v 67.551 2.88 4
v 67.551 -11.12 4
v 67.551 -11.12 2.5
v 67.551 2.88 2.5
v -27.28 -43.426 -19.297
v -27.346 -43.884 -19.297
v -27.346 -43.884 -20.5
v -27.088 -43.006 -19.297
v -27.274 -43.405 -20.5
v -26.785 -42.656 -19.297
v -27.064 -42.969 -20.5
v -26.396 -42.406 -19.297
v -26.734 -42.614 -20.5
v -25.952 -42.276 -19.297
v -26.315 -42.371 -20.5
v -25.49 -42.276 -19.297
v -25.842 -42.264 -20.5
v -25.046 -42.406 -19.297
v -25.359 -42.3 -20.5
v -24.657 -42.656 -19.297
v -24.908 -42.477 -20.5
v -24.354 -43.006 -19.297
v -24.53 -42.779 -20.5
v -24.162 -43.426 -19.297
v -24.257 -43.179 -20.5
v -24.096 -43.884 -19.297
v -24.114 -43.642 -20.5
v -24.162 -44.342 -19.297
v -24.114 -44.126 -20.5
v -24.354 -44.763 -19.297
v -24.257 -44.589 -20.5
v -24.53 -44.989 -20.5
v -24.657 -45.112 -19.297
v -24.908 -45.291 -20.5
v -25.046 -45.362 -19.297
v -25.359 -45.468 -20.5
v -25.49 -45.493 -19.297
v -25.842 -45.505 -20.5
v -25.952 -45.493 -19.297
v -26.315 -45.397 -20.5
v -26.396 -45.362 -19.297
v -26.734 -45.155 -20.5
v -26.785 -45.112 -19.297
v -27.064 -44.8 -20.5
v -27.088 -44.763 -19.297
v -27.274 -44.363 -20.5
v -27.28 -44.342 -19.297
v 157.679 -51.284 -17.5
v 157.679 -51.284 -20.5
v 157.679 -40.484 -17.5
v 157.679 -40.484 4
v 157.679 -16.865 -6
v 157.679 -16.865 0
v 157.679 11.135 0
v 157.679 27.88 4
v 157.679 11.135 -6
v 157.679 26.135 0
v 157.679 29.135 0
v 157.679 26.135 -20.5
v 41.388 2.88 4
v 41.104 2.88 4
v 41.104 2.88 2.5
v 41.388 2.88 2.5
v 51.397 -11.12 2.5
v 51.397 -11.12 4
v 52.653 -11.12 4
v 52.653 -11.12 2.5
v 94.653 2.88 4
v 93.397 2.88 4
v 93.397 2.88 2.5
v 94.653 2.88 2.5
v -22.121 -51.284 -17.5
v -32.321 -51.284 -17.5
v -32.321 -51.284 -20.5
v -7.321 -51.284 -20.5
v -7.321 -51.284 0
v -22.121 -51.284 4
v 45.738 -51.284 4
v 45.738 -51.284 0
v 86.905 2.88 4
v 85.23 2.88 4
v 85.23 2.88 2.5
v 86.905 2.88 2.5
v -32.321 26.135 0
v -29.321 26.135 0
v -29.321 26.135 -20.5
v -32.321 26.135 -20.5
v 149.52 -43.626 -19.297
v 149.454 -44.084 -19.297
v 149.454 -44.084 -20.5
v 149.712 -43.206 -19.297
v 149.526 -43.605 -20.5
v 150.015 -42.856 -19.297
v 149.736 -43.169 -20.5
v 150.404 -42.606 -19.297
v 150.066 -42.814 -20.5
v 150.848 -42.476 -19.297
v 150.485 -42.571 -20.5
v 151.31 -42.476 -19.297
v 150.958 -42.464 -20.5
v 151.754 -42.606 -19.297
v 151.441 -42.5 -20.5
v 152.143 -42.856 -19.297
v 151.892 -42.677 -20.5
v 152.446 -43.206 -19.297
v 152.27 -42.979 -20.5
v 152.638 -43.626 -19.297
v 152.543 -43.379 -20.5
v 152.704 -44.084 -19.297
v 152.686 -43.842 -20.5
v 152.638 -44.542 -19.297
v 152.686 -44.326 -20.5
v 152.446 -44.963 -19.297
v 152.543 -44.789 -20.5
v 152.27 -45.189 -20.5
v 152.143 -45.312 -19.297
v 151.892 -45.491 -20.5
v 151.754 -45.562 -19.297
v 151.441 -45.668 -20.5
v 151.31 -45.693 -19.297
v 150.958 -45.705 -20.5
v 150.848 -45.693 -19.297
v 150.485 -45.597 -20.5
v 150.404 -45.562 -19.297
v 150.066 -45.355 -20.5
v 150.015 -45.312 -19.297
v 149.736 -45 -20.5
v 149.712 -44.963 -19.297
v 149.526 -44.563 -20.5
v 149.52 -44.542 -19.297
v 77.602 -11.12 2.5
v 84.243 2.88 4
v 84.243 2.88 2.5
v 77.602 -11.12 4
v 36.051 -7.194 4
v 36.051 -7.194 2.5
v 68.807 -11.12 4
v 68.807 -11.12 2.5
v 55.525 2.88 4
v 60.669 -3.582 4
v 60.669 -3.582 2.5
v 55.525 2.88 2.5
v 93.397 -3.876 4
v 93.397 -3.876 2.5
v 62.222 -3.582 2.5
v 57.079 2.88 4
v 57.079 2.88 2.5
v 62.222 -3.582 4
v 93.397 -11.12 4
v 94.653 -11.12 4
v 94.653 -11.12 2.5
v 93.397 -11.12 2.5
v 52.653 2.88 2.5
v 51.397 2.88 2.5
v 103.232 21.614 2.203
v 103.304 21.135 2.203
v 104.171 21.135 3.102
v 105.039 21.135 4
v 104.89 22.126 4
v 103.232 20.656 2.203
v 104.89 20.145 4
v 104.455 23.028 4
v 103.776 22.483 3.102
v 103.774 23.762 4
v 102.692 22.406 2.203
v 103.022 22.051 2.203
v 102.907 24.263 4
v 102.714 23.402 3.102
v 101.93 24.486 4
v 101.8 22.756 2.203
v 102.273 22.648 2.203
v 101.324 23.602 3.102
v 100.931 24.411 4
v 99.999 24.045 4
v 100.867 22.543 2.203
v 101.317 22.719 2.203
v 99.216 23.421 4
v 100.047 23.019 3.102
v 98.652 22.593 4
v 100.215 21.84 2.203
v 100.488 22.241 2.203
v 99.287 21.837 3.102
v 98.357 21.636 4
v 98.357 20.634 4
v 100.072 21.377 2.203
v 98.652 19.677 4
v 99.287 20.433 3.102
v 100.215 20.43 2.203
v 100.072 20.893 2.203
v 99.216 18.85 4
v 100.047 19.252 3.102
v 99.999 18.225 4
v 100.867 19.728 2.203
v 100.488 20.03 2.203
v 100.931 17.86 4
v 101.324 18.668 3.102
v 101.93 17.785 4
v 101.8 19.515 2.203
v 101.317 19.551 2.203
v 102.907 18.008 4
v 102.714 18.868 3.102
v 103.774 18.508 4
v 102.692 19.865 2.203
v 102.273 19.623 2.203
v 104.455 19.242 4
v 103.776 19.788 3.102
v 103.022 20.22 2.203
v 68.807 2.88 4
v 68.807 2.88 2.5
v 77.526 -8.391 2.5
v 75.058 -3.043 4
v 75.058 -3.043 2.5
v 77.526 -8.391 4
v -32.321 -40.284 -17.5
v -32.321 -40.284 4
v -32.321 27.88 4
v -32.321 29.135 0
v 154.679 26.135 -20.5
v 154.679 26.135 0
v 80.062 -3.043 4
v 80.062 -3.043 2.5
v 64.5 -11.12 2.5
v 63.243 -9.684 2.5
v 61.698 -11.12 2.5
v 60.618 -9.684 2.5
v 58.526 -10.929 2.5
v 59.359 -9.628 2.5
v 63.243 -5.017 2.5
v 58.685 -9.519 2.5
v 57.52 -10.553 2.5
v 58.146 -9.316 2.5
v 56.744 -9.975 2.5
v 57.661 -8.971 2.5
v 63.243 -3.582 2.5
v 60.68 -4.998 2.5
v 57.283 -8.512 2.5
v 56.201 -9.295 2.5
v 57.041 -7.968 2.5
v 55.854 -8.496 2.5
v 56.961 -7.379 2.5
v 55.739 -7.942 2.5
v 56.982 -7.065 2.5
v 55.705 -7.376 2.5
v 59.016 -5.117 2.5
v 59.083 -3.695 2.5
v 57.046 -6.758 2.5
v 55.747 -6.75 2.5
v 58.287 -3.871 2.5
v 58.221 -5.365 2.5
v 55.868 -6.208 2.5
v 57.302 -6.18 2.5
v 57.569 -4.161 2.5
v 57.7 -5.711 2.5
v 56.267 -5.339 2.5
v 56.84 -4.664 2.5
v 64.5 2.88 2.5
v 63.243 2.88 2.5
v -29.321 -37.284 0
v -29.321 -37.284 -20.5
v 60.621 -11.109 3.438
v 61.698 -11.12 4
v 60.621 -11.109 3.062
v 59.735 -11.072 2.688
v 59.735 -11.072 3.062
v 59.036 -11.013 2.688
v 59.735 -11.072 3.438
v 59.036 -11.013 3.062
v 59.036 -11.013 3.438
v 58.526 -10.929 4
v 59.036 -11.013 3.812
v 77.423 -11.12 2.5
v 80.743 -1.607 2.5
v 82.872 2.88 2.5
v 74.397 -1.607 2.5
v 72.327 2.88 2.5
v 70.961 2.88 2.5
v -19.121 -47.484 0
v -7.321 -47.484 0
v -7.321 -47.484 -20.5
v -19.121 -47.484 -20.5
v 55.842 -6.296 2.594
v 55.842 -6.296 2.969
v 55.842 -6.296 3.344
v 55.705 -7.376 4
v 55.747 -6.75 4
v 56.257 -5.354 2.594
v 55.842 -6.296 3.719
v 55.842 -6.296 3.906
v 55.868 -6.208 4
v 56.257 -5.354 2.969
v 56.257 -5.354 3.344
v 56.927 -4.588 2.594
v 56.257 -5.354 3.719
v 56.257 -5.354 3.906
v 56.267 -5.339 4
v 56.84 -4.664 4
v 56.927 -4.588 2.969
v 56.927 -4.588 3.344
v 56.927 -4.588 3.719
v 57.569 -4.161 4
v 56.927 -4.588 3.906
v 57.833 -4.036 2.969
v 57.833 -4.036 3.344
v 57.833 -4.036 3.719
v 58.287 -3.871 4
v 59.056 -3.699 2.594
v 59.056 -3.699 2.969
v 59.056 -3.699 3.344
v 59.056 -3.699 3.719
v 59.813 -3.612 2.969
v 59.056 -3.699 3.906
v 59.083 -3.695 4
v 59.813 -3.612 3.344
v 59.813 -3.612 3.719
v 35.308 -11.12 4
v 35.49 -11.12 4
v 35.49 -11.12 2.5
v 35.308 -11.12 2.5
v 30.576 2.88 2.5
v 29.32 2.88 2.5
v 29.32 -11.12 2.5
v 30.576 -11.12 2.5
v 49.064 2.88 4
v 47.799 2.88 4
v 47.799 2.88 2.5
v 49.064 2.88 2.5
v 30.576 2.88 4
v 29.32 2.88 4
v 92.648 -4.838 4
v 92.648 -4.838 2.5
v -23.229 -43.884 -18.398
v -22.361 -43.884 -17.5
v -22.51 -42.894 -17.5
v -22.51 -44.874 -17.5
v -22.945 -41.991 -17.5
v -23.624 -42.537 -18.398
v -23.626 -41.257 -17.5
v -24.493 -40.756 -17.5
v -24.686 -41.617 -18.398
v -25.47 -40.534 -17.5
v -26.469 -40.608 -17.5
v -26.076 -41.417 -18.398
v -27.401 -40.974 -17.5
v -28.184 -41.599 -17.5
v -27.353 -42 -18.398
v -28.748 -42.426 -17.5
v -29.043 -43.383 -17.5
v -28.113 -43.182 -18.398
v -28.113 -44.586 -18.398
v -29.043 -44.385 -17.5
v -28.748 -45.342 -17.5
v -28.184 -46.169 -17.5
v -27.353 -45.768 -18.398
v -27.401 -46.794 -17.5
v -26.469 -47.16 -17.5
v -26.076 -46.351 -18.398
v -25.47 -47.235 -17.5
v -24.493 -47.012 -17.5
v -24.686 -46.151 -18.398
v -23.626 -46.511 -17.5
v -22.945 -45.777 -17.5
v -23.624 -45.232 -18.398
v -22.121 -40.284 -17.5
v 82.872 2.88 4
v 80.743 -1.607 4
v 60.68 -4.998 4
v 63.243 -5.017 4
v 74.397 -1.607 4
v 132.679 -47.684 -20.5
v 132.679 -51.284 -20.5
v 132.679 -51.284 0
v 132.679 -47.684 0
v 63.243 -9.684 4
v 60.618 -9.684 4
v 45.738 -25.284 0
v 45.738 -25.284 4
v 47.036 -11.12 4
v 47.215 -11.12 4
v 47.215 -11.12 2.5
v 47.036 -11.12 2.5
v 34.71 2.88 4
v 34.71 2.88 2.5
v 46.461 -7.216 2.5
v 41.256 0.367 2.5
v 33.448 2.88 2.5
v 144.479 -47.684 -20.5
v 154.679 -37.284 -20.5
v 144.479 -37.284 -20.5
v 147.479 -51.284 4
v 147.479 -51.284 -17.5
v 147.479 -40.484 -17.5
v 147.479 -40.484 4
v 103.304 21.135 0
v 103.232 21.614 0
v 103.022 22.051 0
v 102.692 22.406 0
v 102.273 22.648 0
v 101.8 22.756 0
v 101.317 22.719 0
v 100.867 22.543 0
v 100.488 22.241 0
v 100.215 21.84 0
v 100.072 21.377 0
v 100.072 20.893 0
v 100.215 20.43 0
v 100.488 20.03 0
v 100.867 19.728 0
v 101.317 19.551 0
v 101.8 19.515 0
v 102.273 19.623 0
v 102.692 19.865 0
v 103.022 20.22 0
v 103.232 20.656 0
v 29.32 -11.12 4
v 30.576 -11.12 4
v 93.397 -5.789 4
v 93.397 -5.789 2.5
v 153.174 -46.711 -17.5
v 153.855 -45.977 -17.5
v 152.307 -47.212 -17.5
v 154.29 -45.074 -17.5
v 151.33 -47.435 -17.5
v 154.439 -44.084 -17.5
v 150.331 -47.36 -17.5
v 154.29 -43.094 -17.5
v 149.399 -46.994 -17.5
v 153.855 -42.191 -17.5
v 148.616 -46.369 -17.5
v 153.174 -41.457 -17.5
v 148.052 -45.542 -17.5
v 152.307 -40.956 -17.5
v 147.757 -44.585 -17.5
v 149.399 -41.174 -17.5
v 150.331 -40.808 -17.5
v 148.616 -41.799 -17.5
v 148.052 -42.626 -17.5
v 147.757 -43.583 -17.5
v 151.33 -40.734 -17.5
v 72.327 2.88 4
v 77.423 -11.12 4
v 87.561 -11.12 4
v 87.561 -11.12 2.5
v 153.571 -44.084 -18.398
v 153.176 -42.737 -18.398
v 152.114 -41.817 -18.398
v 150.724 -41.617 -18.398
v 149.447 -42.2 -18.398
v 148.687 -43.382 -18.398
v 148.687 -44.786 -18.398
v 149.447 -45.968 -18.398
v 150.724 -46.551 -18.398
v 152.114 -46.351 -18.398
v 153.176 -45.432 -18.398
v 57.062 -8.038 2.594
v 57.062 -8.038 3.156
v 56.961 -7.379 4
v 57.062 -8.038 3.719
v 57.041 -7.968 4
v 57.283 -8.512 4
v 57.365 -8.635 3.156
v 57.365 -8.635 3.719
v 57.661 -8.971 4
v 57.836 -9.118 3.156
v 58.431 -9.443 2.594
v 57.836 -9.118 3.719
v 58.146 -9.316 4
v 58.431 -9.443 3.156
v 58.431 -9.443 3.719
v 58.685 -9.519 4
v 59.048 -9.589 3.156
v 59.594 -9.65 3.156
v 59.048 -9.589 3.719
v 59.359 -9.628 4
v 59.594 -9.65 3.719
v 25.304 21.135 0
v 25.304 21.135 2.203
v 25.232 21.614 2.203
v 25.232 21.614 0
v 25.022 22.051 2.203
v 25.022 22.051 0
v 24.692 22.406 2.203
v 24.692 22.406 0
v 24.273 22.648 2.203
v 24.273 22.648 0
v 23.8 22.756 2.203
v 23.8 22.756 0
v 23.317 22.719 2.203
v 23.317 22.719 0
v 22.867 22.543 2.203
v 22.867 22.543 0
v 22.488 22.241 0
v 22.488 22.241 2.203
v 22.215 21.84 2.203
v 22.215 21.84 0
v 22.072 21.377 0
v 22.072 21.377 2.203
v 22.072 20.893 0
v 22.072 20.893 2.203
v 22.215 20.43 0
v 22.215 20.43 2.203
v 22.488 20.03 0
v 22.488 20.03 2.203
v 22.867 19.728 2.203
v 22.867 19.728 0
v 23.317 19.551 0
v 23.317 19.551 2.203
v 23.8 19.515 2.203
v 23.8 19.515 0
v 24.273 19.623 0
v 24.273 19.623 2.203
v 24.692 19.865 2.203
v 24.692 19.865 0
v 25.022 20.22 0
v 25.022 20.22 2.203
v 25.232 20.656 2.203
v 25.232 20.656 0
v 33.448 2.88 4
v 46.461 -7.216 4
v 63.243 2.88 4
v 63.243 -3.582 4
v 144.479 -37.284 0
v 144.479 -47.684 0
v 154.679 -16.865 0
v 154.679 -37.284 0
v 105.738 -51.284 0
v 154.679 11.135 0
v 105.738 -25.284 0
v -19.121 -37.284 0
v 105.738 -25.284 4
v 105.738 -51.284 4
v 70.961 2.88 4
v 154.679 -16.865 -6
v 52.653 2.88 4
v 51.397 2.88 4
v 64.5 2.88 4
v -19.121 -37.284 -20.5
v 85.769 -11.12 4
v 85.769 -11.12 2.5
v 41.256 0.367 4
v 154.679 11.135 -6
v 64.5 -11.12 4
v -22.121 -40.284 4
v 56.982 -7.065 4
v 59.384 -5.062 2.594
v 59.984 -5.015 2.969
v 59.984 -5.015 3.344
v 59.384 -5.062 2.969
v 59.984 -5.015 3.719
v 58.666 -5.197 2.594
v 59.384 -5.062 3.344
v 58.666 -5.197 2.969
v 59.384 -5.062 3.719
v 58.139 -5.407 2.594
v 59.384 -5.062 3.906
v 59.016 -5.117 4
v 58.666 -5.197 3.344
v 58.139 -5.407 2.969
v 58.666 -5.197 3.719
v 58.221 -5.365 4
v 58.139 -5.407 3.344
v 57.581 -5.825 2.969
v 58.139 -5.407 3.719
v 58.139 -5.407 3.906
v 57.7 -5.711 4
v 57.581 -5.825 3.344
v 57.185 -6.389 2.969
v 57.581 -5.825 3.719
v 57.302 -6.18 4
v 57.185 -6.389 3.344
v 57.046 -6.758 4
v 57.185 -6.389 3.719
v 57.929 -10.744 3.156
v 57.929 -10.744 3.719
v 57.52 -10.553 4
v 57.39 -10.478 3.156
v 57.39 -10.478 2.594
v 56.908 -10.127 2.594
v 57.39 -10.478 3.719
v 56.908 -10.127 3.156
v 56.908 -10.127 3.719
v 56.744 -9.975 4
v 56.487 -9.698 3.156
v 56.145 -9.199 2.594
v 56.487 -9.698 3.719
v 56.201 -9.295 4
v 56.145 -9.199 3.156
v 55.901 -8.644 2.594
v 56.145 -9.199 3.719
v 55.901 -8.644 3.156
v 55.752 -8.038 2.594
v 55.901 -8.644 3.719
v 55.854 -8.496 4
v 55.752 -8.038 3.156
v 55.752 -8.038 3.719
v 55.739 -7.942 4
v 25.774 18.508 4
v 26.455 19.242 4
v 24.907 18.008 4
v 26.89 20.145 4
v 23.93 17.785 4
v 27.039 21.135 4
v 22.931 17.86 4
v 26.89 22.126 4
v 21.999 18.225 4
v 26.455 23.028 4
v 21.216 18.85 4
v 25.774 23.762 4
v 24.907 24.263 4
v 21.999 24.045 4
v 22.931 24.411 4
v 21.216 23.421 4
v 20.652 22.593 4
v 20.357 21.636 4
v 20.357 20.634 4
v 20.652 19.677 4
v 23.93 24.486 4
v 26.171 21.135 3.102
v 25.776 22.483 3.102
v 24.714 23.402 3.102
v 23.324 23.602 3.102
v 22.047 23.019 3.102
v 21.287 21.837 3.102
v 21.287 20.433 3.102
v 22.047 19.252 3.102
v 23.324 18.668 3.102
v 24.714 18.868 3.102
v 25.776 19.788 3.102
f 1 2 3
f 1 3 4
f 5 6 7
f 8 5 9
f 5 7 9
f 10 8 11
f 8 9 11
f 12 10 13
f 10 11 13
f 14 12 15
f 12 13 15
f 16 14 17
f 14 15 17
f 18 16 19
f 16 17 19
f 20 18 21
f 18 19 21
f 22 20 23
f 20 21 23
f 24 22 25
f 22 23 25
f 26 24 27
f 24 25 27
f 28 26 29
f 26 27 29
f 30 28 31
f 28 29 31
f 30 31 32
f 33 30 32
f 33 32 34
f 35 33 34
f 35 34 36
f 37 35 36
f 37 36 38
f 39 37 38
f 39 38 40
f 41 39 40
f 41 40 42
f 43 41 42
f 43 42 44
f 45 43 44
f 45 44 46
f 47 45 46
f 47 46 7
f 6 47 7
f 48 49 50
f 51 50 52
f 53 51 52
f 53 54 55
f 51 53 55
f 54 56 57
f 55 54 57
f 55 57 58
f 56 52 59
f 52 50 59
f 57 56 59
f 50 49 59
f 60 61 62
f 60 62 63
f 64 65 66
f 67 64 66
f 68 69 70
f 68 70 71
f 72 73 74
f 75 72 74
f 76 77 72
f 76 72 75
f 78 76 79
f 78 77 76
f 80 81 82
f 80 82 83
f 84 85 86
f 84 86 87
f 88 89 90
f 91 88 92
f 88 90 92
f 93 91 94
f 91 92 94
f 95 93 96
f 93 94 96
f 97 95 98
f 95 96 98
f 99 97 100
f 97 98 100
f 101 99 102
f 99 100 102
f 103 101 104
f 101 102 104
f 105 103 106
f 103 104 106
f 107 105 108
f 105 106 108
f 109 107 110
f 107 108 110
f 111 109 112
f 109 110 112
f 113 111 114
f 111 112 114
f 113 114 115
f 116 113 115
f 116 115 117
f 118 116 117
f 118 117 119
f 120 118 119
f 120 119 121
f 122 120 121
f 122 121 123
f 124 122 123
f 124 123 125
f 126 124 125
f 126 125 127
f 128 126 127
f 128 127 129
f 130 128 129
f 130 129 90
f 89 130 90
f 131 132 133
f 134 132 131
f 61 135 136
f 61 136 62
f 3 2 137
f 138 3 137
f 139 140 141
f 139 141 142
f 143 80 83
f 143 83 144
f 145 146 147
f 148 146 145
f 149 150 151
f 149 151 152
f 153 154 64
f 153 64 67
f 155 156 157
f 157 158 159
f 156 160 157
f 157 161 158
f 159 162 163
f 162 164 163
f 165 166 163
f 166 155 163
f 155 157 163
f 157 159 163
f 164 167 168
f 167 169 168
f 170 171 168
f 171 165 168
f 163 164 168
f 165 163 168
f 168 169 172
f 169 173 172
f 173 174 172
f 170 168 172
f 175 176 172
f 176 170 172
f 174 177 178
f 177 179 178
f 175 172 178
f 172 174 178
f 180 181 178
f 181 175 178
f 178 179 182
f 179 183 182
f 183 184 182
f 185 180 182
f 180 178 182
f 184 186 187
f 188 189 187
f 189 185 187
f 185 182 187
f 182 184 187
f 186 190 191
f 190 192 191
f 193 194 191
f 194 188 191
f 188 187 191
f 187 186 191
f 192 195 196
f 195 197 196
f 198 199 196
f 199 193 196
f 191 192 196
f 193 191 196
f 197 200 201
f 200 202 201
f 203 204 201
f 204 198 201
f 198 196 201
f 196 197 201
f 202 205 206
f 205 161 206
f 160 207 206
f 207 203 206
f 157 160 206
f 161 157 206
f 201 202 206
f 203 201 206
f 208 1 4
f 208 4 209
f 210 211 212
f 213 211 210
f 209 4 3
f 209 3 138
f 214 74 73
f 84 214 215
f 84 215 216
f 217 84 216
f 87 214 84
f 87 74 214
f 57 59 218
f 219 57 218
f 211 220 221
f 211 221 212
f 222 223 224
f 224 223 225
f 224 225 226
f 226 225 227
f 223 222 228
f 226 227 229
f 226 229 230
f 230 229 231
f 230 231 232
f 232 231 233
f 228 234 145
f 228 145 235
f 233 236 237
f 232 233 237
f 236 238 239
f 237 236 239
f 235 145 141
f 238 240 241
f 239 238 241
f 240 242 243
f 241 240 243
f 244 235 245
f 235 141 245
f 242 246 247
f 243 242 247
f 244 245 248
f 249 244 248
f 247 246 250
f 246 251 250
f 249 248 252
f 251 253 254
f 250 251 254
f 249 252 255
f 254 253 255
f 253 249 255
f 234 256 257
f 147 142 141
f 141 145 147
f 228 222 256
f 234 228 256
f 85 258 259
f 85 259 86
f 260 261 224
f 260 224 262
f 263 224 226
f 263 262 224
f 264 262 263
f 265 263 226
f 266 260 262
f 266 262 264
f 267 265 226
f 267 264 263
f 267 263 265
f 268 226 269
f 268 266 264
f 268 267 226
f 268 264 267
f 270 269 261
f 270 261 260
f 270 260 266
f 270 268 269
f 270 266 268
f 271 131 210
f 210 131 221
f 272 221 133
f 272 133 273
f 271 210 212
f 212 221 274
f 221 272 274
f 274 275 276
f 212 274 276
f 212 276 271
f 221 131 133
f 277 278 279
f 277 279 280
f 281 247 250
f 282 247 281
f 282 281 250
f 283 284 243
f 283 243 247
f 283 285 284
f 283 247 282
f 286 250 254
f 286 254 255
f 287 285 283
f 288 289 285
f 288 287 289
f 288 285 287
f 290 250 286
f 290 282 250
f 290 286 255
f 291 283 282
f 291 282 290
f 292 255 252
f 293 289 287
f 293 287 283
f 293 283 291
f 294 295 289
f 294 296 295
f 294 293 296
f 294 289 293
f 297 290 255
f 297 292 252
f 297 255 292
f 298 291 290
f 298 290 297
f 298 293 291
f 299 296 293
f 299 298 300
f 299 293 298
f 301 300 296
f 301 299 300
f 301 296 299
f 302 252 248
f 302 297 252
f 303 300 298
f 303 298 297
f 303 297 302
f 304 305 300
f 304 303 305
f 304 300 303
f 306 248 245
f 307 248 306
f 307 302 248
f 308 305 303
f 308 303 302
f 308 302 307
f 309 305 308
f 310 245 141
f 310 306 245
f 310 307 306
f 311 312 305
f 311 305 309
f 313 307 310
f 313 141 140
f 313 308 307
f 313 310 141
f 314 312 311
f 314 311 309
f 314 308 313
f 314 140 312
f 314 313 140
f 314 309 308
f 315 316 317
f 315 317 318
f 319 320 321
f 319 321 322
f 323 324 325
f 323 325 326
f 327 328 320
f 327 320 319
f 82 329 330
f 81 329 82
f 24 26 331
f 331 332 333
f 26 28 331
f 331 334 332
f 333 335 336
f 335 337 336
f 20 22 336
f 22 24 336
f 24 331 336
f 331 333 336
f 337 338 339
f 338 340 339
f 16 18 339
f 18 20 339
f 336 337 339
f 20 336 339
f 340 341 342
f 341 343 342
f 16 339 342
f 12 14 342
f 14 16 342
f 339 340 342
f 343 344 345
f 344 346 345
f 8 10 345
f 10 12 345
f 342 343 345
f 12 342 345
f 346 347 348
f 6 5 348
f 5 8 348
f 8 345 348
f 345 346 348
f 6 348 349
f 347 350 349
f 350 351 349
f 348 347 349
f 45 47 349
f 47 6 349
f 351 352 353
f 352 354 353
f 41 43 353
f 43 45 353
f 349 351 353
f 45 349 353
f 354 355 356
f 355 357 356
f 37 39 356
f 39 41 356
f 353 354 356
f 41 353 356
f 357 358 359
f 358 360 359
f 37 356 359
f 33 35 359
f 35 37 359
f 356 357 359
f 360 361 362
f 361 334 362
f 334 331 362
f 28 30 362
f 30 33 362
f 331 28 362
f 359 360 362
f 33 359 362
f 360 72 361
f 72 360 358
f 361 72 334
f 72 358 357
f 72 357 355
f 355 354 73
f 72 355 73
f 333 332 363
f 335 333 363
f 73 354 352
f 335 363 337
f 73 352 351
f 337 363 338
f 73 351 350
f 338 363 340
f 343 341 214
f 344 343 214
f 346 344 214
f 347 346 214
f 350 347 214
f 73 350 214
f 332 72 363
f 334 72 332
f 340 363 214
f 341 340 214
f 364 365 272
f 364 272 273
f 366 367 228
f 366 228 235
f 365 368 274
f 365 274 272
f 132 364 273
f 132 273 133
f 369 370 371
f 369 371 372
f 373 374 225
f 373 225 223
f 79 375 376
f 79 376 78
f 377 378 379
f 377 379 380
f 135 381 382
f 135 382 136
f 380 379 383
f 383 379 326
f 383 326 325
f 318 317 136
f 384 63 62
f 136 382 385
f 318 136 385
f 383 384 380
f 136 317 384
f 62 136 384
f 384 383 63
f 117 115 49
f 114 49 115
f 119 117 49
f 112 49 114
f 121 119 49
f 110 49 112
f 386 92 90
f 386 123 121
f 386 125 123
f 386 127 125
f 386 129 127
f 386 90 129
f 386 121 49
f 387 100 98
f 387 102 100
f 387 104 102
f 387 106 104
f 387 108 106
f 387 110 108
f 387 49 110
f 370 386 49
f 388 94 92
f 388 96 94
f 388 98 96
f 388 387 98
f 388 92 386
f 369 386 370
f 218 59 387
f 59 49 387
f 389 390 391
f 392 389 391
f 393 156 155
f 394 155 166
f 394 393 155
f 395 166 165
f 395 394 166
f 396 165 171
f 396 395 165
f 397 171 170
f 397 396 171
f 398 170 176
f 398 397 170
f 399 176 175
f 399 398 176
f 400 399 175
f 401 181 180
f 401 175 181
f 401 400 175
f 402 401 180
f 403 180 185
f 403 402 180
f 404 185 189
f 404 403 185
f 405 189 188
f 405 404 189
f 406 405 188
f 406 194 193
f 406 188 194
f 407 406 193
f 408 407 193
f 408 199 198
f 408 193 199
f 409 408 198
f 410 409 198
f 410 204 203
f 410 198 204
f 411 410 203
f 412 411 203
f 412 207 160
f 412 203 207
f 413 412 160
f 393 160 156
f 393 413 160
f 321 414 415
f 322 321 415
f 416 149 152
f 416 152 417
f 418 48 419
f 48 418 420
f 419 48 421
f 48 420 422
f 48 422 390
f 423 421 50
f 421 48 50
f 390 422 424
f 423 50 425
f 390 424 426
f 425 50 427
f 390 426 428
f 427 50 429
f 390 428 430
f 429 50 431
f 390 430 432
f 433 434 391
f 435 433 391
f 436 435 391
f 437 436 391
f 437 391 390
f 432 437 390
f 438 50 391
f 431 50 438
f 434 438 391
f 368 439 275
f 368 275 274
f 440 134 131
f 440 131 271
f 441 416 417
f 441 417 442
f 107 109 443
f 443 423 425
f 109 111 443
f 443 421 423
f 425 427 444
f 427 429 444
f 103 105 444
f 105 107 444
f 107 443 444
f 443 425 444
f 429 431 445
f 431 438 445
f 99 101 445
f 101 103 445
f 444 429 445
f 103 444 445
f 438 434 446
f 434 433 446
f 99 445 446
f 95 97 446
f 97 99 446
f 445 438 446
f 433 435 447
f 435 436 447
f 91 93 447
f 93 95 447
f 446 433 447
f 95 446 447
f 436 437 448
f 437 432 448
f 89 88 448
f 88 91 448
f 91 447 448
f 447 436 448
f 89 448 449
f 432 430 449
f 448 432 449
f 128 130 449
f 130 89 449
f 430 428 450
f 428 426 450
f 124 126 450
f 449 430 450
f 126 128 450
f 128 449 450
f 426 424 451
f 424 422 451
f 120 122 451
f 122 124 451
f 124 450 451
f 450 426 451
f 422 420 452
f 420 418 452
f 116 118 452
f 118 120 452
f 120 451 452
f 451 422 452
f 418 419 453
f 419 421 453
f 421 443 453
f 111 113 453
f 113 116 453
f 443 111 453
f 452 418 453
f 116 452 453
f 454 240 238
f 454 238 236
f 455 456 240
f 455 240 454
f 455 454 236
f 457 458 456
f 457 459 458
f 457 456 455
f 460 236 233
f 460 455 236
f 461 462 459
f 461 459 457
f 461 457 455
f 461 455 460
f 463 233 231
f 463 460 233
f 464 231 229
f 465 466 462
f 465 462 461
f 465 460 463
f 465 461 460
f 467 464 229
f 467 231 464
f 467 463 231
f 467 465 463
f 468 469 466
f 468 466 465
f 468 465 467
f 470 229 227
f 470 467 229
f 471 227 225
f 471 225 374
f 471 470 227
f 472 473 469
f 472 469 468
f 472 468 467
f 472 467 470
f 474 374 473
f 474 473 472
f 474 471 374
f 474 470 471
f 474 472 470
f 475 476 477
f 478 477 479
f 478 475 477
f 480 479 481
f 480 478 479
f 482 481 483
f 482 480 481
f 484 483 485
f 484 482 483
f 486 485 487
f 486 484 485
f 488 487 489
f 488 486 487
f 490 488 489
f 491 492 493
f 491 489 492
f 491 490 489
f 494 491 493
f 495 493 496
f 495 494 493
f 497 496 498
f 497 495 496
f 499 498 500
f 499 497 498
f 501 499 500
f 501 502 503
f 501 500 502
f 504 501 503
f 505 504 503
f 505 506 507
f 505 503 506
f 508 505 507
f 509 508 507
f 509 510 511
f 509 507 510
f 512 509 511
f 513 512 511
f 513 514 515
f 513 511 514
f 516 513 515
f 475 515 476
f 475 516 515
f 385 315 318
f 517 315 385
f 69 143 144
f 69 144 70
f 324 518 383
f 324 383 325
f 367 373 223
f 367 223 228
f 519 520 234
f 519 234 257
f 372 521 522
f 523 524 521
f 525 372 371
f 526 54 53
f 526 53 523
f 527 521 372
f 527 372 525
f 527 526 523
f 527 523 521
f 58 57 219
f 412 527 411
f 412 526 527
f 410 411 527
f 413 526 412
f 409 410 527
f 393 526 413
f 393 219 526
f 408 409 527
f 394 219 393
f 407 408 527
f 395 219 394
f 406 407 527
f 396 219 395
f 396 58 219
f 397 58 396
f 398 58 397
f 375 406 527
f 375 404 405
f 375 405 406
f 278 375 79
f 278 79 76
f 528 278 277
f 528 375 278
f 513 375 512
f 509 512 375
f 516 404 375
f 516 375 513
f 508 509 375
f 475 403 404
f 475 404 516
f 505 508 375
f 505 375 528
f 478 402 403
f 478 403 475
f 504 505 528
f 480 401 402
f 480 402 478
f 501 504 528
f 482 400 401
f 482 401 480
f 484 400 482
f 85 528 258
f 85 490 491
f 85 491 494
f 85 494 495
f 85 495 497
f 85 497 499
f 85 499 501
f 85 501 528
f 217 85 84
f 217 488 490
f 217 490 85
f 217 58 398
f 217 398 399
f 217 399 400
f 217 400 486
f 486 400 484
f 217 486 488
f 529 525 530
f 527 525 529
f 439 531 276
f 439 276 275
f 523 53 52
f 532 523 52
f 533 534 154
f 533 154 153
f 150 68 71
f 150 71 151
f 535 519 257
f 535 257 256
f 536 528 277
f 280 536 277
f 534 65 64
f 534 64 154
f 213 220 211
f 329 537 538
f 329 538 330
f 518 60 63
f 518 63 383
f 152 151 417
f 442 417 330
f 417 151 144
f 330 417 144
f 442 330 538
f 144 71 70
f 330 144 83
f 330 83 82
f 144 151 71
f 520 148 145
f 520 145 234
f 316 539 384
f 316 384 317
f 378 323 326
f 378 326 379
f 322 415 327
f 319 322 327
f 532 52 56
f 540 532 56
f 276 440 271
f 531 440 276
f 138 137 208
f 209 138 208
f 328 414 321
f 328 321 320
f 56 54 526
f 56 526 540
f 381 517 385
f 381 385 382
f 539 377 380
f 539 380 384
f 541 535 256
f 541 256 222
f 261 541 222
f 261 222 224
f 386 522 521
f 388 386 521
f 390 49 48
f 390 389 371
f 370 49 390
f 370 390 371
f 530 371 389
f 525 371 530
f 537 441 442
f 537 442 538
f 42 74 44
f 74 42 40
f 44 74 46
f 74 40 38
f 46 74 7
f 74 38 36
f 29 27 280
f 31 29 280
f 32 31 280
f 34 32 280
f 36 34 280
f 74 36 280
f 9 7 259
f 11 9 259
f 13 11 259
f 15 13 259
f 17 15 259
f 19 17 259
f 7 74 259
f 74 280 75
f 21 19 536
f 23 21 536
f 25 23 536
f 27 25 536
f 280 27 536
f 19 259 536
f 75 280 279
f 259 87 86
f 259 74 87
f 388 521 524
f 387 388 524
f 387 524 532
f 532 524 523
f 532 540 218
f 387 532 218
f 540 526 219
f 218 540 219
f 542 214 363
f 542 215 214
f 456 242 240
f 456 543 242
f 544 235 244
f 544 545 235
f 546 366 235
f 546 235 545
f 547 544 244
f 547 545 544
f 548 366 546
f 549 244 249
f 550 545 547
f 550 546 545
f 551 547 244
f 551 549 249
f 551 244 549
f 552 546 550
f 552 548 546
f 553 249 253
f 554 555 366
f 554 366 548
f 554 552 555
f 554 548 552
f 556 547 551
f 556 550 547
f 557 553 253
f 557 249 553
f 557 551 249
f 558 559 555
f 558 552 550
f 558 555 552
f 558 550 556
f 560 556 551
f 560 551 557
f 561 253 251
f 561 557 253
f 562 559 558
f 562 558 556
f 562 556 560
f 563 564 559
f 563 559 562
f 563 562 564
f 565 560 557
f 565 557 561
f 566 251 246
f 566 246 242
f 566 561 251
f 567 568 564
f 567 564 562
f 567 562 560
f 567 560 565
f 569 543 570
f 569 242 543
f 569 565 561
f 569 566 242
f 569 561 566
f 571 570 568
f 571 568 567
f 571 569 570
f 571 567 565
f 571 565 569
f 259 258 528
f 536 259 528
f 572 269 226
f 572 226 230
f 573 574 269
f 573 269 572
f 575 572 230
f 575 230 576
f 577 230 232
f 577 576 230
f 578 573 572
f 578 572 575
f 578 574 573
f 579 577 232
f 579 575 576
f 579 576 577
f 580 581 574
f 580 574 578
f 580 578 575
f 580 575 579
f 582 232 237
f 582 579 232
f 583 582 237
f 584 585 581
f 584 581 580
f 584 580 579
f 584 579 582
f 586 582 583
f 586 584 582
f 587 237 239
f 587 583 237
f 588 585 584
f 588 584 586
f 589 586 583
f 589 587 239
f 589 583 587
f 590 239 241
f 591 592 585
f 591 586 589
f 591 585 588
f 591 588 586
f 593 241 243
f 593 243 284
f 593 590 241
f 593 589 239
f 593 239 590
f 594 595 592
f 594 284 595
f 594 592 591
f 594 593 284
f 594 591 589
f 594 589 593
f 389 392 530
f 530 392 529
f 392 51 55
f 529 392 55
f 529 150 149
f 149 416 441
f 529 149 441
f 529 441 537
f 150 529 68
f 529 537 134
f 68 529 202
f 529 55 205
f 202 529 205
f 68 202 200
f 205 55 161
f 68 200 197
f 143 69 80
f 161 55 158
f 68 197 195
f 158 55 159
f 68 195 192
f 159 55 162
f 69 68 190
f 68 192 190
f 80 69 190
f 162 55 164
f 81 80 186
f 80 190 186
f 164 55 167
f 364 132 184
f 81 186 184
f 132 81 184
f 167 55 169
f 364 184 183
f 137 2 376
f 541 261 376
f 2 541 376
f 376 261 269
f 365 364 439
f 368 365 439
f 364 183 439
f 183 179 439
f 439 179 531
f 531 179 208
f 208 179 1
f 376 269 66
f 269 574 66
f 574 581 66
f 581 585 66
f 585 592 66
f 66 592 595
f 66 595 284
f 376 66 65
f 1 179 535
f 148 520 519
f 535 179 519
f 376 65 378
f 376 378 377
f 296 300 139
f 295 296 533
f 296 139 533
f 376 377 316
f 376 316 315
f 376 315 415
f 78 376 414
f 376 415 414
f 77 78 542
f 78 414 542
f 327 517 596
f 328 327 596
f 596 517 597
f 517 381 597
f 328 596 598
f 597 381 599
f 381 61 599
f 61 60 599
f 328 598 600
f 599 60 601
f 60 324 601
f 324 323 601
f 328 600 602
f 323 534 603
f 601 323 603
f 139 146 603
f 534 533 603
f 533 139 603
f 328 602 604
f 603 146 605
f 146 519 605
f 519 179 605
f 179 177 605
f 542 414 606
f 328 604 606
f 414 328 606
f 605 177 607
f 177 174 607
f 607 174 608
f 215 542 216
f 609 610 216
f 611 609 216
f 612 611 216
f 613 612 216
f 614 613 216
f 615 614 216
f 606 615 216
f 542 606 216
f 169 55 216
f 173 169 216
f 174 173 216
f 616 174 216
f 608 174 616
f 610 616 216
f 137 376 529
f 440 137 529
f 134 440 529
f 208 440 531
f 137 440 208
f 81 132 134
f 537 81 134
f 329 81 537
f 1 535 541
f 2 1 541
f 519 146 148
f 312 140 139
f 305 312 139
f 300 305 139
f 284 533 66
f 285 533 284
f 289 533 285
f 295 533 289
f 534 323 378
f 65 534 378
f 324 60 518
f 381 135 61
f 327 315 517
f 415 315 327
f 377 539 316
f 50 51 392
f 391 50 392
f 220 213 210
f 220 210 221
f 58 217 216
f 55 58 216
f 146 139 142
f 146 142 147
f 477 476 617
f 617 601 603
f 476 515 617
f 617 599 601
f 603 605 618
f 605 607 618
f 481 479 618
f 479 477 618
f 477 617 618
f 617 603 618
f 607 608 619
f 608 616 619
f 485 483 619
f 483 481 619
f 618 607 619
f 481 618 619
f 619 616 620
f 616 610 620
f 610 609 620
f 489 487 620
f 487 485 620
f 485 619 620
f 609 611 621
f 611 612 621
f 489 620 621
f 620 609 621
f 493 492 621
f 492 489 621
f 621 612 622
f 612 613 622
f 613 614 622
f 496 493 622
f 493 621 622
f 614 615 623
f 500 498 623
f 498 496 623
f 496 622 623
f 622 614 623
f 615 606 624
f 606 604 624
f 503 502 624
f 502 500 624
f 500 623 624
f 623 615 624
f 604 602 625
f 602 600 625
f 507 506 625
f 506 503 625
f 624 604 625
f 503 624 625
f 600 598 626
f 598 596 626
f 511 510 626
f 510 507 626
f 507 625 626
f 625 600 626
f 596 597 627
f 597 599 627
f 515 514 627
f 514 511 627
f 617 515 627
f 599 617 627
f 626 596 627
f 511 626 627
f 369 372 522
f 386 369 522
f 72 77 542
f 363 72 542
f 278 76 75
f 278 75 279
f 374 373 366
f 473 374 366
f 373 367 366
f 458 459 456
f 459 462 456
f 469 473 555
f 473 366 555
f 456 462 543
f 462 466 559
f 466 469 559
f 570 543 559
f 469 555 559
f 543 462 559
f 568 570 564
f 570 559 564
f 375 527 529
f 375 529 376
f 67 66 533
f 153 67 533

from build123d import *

# Parameters (mm, degrees)
CROQUIS1_R                      = 1.625
SALIENTE_EXTRUIR1_DEPTH         = 4
CORTAR_EXTRUIR1_START           = -190
CORTAR_EXTRUIR1_DEPTH           = 190
CROQUIS4_R                      = 3.35997123
CORTAR_EXTRUIR2_DEPTH           = 1.8
CORTAR_EXTRUIR2_DRAFT           = -44
CORTAR_EXTRUIR2_PROFILE_2_DEPTH = 1.8
CORTAR_EXTRUIR2_PROFILE_2_DRAFT = -44
CORTAR_EXTRUIR2_PROFILE_3_DEPTH = 1.8
CORTAR_EXTRUIR2_PROFILE_3_DRAFT = -44
CORTAR_EXTRUIR2_PROFILE_4_DEPTH = 1.8
CORTAR_EXTRUIR2_PROFILE_4_DRAFT = -44
CROQUIS5_W                      = 3
CROQUIS5_H                      = 66.6193621
CROQUIS5_H_2                    = 66.4193621
SALIENTE_EXTRUIR2_DEPTH         = 20.5
CROQUIS7_W                      = 10.2
CROQUIS7_H                      = 10.8
CROQUIS7_H_2                    = 11
CORTAR_EXTRUIR3_DEPTH           = 4
SALIENTE_EXTRUIR3_DEPTH         = 20.5
CROQUIS9_W                      = 10.2
CROQUIS9_H                      = 10.8
CROQUIS9_R                      = 1.625
CROQUIS9_H_2                    = 11
SALIENTE_EXTRUIR4_DEPTH         = 3
CROQUIS10_R                     = 3.35997123
CORTAR_EXTRUIR4_DEPTH           = 1.8
CORTAR_EXTRUIR4_DRAFT           = -44
CORTAR_EXTRUIR4_PROFILE_2_DEPTH = 1.8
CORTAR_EXTRUIR4_PROFILE_2_DRAFT = -44
CROQUIS11_W                     = 6
CROQUIS11_H                     = 28
CORTAR_EXTRUIR5_DEPTH           = 3
CROQUIS13_W                     = 1.256410257
CROQUIS13_H                     = 14
CROQUIS13_W_2                   = 1.256410256
CORTAR_EXTRUIR6_DEPTH           = 1.5


with BuildPart() as part:
    # Croquis1 → Saliente-Extruir1 (new body)
    with BuildSketch(Plane.XY):
        Polygon((-32.320991683, -51.284123552), (-32.320991683, 29.135238548), (157.679008317, 29.135238548), (157.679008317, -51.284123552), (105.737585684, -51.284123552), (105.737585684, -25.284123552), (45.737585684, -25.284123552), (45.737585684, -51.284123552), align=None)
        with Locations((23.679008317, 21.135238548)):
            Circle(CROQUIS1_R, mode=Mode.SUBTRACT)
        with Locations((101.679008317, 21.135238548)):
            Circle(CROQUIS1_R, mode=Mode.SUBTRACT)
        with Locations((-25.720991683, -43.884123552)):
            Circle(CROQUIS1_R, mode=Mode.SUBTRACT)
        with Locations((151.079008317, -44.084123552)):
            Circle(CROQUIS1_R, mode=Mode.SUBTRACT)
    extrude(amount=SALIENTE_EXTRUIR1_DEPTH)

    # Croquis3 → Cortar-Extruir1 (cut)
    with BuildSketch(Plane(origin=(157.679008317, 0, 0), x_dir=(0, 0, -1), z_dir=(1, 0, 0)).offset(CORTAR_EXTRUIR1_START)):
        Polygon((-4, 29.135238548), (0, 29.135238548), (-4, 27.880003721), align=None)
    extrude(amount=CORTAR_EXTRUIR1_DEPTH, mode=Mode.SUBTRACT)


with BuildPart() as cortar_extruir2_tool:
    # Croquis4 → Cortar-Extruir2 (with draft: the straight prism first)
    with BuildSketch(Plane.XY.offset(4)):
        with Locations((23.679008317, 21.135238548)):
            Circle(CROQUIS4_R)
    extrude(amount=-CORTAR_EXTRUIR2_DEPTH)
    # Cortar-Extruir2: the draft: its side faces are tilted about the plane it starts from
    cortar_extruir2_sides = [cortar_extruir2_tool.faces().sort_by_distance(p)[0] for p in [
        (20.319037087, 21.135238548, 3.1),
    ]]
    draft(cortar_extruir2_sides, Plane.XY.offset(4), CORTAR_EXTRUIR2_DRAFT)


with BuildPart() as part_1:
    add(part.part)

    # Cortar-Extruir2: cut by cortar_extruir2_tool
    add(cortar_extruir2_tool.part, mode=Mode.SUBTRACT)


with BuildPart() as cortar_extruir2_profile_2_tool:
    # Croquis4 → Cortar-Extruir2 profile 2 (with draft: the straight prism first)
    with BuildSketch(Plane.XY.offset(4)):
        with Locations((101.679008317, 21.135238548)):
            Circle(CROQUIS4_R)
    extrude(amount=-CORTAR_EXTRUIR2_PROFILE_2_DEPTH)
    # Cortar-Extruir2 profile 2: the draft: its side faces are tilted about the plane it starts from
    cortar_extruir2_profile_2_sides = [cortar_extruir2_profile_2_tool.faces().sort_by_distance(p)[0] for p in [
        (98.319037087, 21.135238548, 3.1),
    ]]
    draft(cortar_extruir2_profile_2_sides, Plane.XY.offset(4), CORTAR_EXTRUIR2_PROFILE_2_DRAFT)


with BuildPart() as part_2:
    add(part_1.part)

    # Cortar-Extruir2 profile 2: cut by cortar_extruir2_profile_2_tool
    add(cortar_extruir2_profile_2_tool.part, mode=Mode.SUBTRACT)


with BuildPart() as cortar_extruir2_profile_3_tool:
    # Croquis4 → Cortar-Extruir2 profile 3 (with draft: the straight prism first)
    with BuildSketch(Plane.XY.offset(4)):
        with Locations((-25.720991683, -43.884123552)):
            Circle(CROQUIS4_R)
    extrude(amount=-CORTAR_EXTRUIR2_PROFILE_3_DEPTH)
    # Cortar-Extruir2 profile 3: the draft: its side faces are tilted about the plane it starts from
    cortar_extruir2_profile_3_sides = [cortar_extruir2_profile_3_tool.faces().sort_by_distance(p)[0] for p in [
        (-29.080962913, -43.884123552, 3.1),
    ]]
    draft(cortar_extruir2_profile_3_sides, Plane.XY.offset(4), CORTAR_EXTRUIR2_PROFILE_3_DRAFT)


with BuildPart() as part_3:
    add(part_2.part)

    # Cortar-Extruir2 profile 3: cut by cortar_extruir2_profile_3_tool
    add(cortar_extruir2_profile_3_tool.part, mode=Mode.SUBTRACT)


with BuildPart() as cortar_extruir2_profile_4_tool:
    # Croquis4 → Cortar-Extruir2 profile 4 (with draft: the straight prism first)
    with BuildSketch(Plane.XY.offset(4)):
        with Locations((151.079008317, -44.084123552)):
            Circle(CROQUIS4_R)
    extrude(amount=-CORTAR_EXTRUIR2_PROFILE_4_DEPTH)
    # Cortar-Extruir2 profile 4: the draft: its side faces are tilted about the plane it starts from
    cortar_extruir2_profile_4_sides = [cortar_extruir2_profile_4_tool.faces().sort_by_distance(p)[0] for p in [
        (147.719037087, -44.084123552, 3.1),
    ]]
    draft(cortar_extruir2_profile_4_sides, Plane.XY.offset(4), CORTAR_EXTRUIR2_PROFILE_4_DRAFT)


with BuildPart() as part_4:
    add(part_3.part)

    # Cortar-Extruir2 profile 4: cut by cortar_extruir2_profile_4_tool
    add(cortar_extruir2_profile_4_tool.part, mode=Mode.SUBTRACT)

    # Croquis5 → Saliente-Extruir2 (add)
    with BuildSketch(Plane(origin=(0, 0, 0), x_dir=(-1, 0, 0), z_dir=(0, 0, -1))):
        with Locations((-156.179008317, -7.174442502)):
            Rectangle(CROQUIS5_W, CROQUIS5_H)
        with Locations((30.820991683, -7.074442502)):
            Rectangle(CROQUIS5_W, CROQUIS5_H_2)
    extrude(amount=SALIENTE_EXTRUIR2_DEPTH)

    # Croquis7 → Cortar-Extruir3 (cut)
    with BuildSketch(Plane(origin=(0, 0, 0), x_dir=(-1, 0, 0), z_dir=(0, 0, -1))):
        with Locations((-152.579008317, -45.884123552)):
            Rectangle(CROQUIS7_W, CROQUIS7_H)
        with Locations((27.220991683, -45.784123552)):
            Rectangle(CROQUIS7_W, CROQUIS7_H_2)
    extrude(amount=-CORTAR_EXTRUIR3_DEPTH, mode=Mode.SUBTRACT)

    # Croquis8 → Saliente-Extruir3 (add)
    with BuildSketch(Plane(origin=(0, 0, 0), x_dir=(-1, 0, 0), z_dir=(0, 0, -1))):
        Polygon((7.320991683, -47.484123552), (19.120991683, -47.484123552), (19.120991683, -40.284123552), (19.120991683, -37.284123552), (22.120991683, -37.284123552), (29.320991683, -37.284123552), (29.320991683, -40.284123552), (22.120991683, -40.284123552), (22.120991683, -47.484123552), (22.120991683, -51.284123552), (7.320991683, -51.284123552), align=None)
        Polygon((-132.679008317, -47.684123552), (-144.479008317, -47.684123552), (-144.479008317, -40.484123552), (-144.479008317, -37.284123552), (-154.679008317, -37.284123552), (-154.679008317, -40.484123552), (-147.479008317, -40.484123552), (-147.479008317, -47.684123552), (-147.479008317, -51.284123552), (-132.679008317, -51.284123552), align=None)
    extrude(amount=SALIENTE_EXTRUIR3_DEPTH)

    # Croquis9 → Saliente-Extruir4 (add)
    # profile 1 of 2: a face of its own
    with BuildSketch(Plane(origin=(0, 0, -20.5), x_dir=(-1, 0, 0), z_dir=(0, 0, -1))):
        with Locations((-152.579008317, -45.884123552)):
            Rectangle(CROQUIS9_W, CROQUIS9_H)
        with Locations((-151.079008317, -44.084123552)):
            Circle(CROQUIS9_R, mode=Mode.SUBTRACT)
    # profile 2 of 2: a face of its own
    with BuildSketch(Plane(origin=(0, 0, -20.5), x_dir=(-1, 0, 0), z_dir=(0, 0, -1))):
        with Locations((27.220991683, -45.784123552)):
            Rectangle(CROQUIS9_W, CROQUIS9_H_2)
        with Locations((25.720991683, -43.884123552)):
            Circle(CROQUIS9_R, mode=Mode.SUBTRACT)
    extrude(amount=-SALIENTE_EXTRUIR4_DEPTH)


with BuildPart() as cortar_extruir4_tool:
    # Croquis10 → Cortar-Extruir4 (with draft: the straight prism first)
    with BuildSketch(Plane.XY.offset(-17.5)):
        with Locations((-25.720991683, -43.884123552)):
            Circle(CROQUIS10_R)
    extrude(amount=-CORTAR_EXTRUIR4_DEPTH)
    # Cortar-Extruir4: the draft: its side faces are tilted about the plane it starts from
    cortar_extruir4_sides = [cortar_extruir4_tool.faces().sort_by_distance(p)[0] for p in [
        (-29.080962913, -43.884123552, -18.4),
    ]]
    draft(cortar_extruir4_sides, Plane.XY.offset(-17.5), CORTAR_EXTRUIR4_DRAFT)


with BuildPart() as part_5:
    add(part_4.part)

    # Cortar-Extruir4: cut by cortar_extruir4_tool
    add(cortar_extruir4_tool.part, mode=Mode.SUBTRACT)


with BuildPart() as cortar_extruir4_profile_2_tool:
    # Croquis10 → Cortar-Extruir4 profile 2 (with draft: the straight prism first)
    with BuildSketch(Plane.XY.offset(-17.5)):
        with Locations((151.079008317, -44.084123552)):
            Circle(CROQUIS10_R)
    extrude(amount=-CORTAR_EXTRUIR4_PROFILE_2_DEPTH)
    # Cortar-Extruir4 profile 2: the draft: its side faces are tilted about the plane it starts from
    cortar_extruir4_profile_2_sides = [cortar_extruir4_profile_2_tool.faces().sort_by_distance(p)[0] for p in [
        (147.719037087, -44.084123552, -18.4),
    ]]
    draft(cortar_extruir4_profile_2_sides, Plane.XY.offset(-17.5), CORTAR_EXTRUIR4_PROFILE_2_DRAFT)


with BuildPart() as part_6:
    add(part_5.part)

    # Cortar-Extruir4 profile 2: cut by cortar_extruir4_profile_2_tool
    add(cortar_extruir4_profile_2_tool.part, mode=Mode.SUBTRACT)

    # Croquis11 → Cortar-Extruir5 (cut)
    with BuildSketch(Plane(origin=(157.679008317, 0, 0), x_dir=(0, 0, -1), z_dir=(1, 0, 0))):
        with Locations((3, -2.864761452)):
            Rectangle(CROQUIS11_W, CROQUIS11_H)
    extrude(amount=-CORTAR_EXTRUIR5_DEPTH, mode=Mode.SUBTRACT)

    # Croquis13 → Cortar-Extruir6 (cut)
    # profile 1 of 7: a face of its own
    with BuildSketch(Plane.XY.offset(4)):
        with Locations((29.948239087, -4.119996279)):
            Rectangle(CROQUIS13_W, CROQUIS13_H)
    # profile 2 of 7: a face of its own
    with BuildSketch(Plane.XY.offset(4)):
        Polygon((49.063623702, 2.880003721), (47.215466651, -11.119996279), (47.035979471, -11.119996279), (41.255931394, 0.367183208), (35.489905753, -11.119996279), (35.307614086, -11.119996279), (33.448239086, 2.880003721), (34.710258317, 2.880003721), (36.050803189, -7.193714227), (41.104489086, 2.880003721), (41.387742292, 2.880003721), (46.461059599, -7.216150125), (47.798799984, 2.880003721), align=None)
    # profile 3 of 7: a face of its own
    with BuildSketch(Plane.XY.offset(4)):
        with Locations((52.025162163, -4.119996279)):
            Rectangle(CROQUIS13_W, CROQUIS13_H)
    # profile 4 of 7: a face of its own
    with BuildSketch(Plane.XY.offset(4)):
        with BuildLine():
            Line((64.499521138, -11.119996279), (61.697838445, -11.119996279))
            add(Edge.make_bspline(
                [(61.697838445, -11.119996279), (61.510873931, -11.119373935), (61.151881354, -11.118178965), (60.637588272, -11.111515914), (60.170279884, -11.092418491), (59.750200527, -11.075984157), (59.377357907, -11.046016392), (59.050608744, -11.017373803), (58.771457954, -10.97987916), (58.602474549, -10.945057468), (58.525963445, -10.929291151)],
                knots=[0, 0, 0, 0, 1.410062039, 2.707475311, 3.878576406, 4.937260626, 5.877586885, 6.699081471, 7.410979367, 8, 8, 8, 8], degree=3))
            add(Edge.make_bspline(
                [(58.525963445, -10.929291151), (58.423535224, -10.903986891), (58.220863854, -10.853918181), (57.92908861, -10.748039124), (57.650939007, -10.625710612), (57.387433636, -10.48093382), (57.138641547, -10.316153486), (56.904587805, -10.130707187), (56.688410611, -9.923006028), (56.482418712, -9.701653806), (56.302548437, -9.457013121), (56.140617473, -9.201498836), (56.004681977, -8.930191666), (55.897715912, -8.644460022), (55.808043127, -8.347106788), (55.747774644, -8.035193709), (55.710238379, -7.709735592), (55.706529794, -7.488290447), (55.704649343, -7.376005894)],
                knots=[0, 0, 0, 0, 1.027276577, 2.032638556, 3.019345632, 3.985365262, 4.957888996, 5.923693931, 6.890056973, 7.876427719, 8.865527834, 9.843495157, 10.821038291, 11.815616373, 12.812734995, 13.843357168, 14.906466538, 16, 16, 16, 16], degree=3))
            add(Edge.make_bspline(
                [(55.704649343, -7.376005894), (55.710525183, -7.189465261), (55.721990468, -6.825476171), (55.828893013, -6.297235643), (56.003991303, -5.80446742), (56.245313156, -5.347857264), (56.552484852, -4.936065183), (56.92163538, -4.575598095), (57.350879516, -4.271167216), (57.752353734, -4.062300802), (58.10716327, -3.927907198), (58.40012195, -3.832872669), (58.719933006, -3.760684762), (59.062008263, -3.695076041), (59.428989945, -3.645011316), (59.82013904, -3.609455846), (60.236433836, -3.586593409), (60.521792882, -3.583253109), (60.668591651, -3.58153474)],
                knots=[0, 0, 0, 0, 1.260402266, 2.459371274, 3.627181936, 4.786749125, 5.93865593, 7.087644312, 8.261344208, 9.485713728, 10.136162886, 10.825977872, 11.566646758, 12.35154167, 13.181268117, 14.0701832, 15.007234106, 16, 16, 16, 16], degree=3))
            Line((60.668591651, -3.58153474), (55.525162163, 2.880003721))
            Line((55.525162163, 2.880003721), (57.078848061, 2.880003721))
            Line((57.078848061, 2.880003721), (62.222277548, -3.58153474))
            Line((62.222277548, -3.58153474), (63.243110881, -3.58153474))
            Line((63.243110881, -3.58153474), (63.243110881, 2.880003721))
            Line((63.243110881, 2.880003721), (64.499521138, 2.880003721))
            Line((64.499521138, 2.880003721), (64.499521138, -11.119996279))
        make_face()
        with BuildLine():
            Line((63.243110881, -9.684098843), (63.243110881, -5.017432176))
            Line((63.243110881, -5.017432176), (60.679809599, -4.997800766))
            add(Edge.make_bspline(
                [(60.679809599, -4.997800766), (60.560129428, -4.997747789), (60.328155171, -4.997645104), (59.992552716, -5.013620621), (59.680071574, -5.031792493), (59.391910885, -5.059594549), (59.127928962, -5.095403481), (58.888300168, -5.140265497), (58.672494956, -5.192310561), (58.421604389, -5.273687036), (58.138223081, -5.397054236), (57.836601799, -5.588345801), (57.572842627, -5.819684755), (57.353555996, -6.08756285), (57.177424726, -6.383355629), (57.055085869, -6.700368862), (56.974465275, -7.033607695), (56.965579678, -7.262416159), (56.961059599, -7.378810381)],
                knots=[0, 0, 0, 0, 1.146399208, 2.222048177, 3.218135709, 4.144938032, 4.994811973, 5.769438708, 6.479732432, 7.119818093, 8.294689872, 9.430121864, 10.527913442, 11.641375077, 12.733452768, 13.811150417, 14.886538365, 16, 16, 16, 16], degree=3))
            add(Edge.make_bspline(
                [(56.961059599, -7.378810381), (56.965808546, -7.491418694), (56.975219226, -7.71456728), (57.053802215, -8.040515814), (57.182115791, -8.350450089), (57.357744144, -8.640105209), (57.576332464, -8.901088562), (57.830938626, -9.123707736), (58.115571182, -9.3086534), (58.379444082, -9.430680999), (58.617022621, -9.502482228), (58.822348787, -9.554602662), (59.056372543, -9.591105452), (59.31633946, -9.624678267), (59.603391554, -9.653109297), (59.917703754, -9.671980414), (60.259051323, -9.683259712), (60.495638983, -9.683812623), (60.618110881, -9.684098843)],
                knots=[0, 0, 0, 0, 1.100596872, 2.180981401, 3.259506136, 4.371595435, 5.481727359, 6.576991111, 7.667816242, 8.793363246, 9.406619729, 10.09427138, 10.864108636, 11.721733836, 12.6590937, 13.685439239, 14.801845161, 16, 16, 16, 16], degree=3))
            Line((60.618110881, -9.684098843), (63.243110881, -9.684098843))
        make_face(mode=Mode.SUBTRACT)
    # profile 5 of 7: a face of its own
    with BuildSketch(Plane.XY.offset(4)):
        with Locations((68.179008317, -4.119996279)):
            Rectangle(CROQUIS13_W_2, CROQUIS13_H)
    # profile 6 of 7: a face of its own
    with BuildSketch(Plane.XY.offset(4)):
        Polygon((77.422598061, -11.119996279), (70.961059599, 2.880003721), (72.326844856, 2.880003721), (74.396556394, -1.607175766), (80.743110881, -1.607175766), (82.871716651, 2.880003721), (84.243110881, 2.880003721), (77.60208524, -11.119996279), align=None)
        Polygon((77.526364086, -8.391230253), (80.061620497, -3.043073202), (75.058415368, -3.043073202), align=None, mode=Mode.SUBTRACT)
    # profile 7 of 7: a face of its own
    with BuildSketch(Plane.XY.offset(4)):
        Polygon((94.653367292, -11.119996279), (93.396957035, -11.119996279), (93.396957035, -5.788666151), (87.560819215, -11.119996279), (85.768751907, -11.119996279), (92.648158958, -4.837944997), (85.230290368, 2.880003721), (86.904569215, 2.880003721), (93.396957035, -3.876005894), (93.396957035, 2.880003721), (94.653367292, 2.880003721), align=None)
    extrude(amount=-CORTAR_EXTRUIR6_DEPTH, mode=Mode.SUBTRACT)


solid = part_6.part
